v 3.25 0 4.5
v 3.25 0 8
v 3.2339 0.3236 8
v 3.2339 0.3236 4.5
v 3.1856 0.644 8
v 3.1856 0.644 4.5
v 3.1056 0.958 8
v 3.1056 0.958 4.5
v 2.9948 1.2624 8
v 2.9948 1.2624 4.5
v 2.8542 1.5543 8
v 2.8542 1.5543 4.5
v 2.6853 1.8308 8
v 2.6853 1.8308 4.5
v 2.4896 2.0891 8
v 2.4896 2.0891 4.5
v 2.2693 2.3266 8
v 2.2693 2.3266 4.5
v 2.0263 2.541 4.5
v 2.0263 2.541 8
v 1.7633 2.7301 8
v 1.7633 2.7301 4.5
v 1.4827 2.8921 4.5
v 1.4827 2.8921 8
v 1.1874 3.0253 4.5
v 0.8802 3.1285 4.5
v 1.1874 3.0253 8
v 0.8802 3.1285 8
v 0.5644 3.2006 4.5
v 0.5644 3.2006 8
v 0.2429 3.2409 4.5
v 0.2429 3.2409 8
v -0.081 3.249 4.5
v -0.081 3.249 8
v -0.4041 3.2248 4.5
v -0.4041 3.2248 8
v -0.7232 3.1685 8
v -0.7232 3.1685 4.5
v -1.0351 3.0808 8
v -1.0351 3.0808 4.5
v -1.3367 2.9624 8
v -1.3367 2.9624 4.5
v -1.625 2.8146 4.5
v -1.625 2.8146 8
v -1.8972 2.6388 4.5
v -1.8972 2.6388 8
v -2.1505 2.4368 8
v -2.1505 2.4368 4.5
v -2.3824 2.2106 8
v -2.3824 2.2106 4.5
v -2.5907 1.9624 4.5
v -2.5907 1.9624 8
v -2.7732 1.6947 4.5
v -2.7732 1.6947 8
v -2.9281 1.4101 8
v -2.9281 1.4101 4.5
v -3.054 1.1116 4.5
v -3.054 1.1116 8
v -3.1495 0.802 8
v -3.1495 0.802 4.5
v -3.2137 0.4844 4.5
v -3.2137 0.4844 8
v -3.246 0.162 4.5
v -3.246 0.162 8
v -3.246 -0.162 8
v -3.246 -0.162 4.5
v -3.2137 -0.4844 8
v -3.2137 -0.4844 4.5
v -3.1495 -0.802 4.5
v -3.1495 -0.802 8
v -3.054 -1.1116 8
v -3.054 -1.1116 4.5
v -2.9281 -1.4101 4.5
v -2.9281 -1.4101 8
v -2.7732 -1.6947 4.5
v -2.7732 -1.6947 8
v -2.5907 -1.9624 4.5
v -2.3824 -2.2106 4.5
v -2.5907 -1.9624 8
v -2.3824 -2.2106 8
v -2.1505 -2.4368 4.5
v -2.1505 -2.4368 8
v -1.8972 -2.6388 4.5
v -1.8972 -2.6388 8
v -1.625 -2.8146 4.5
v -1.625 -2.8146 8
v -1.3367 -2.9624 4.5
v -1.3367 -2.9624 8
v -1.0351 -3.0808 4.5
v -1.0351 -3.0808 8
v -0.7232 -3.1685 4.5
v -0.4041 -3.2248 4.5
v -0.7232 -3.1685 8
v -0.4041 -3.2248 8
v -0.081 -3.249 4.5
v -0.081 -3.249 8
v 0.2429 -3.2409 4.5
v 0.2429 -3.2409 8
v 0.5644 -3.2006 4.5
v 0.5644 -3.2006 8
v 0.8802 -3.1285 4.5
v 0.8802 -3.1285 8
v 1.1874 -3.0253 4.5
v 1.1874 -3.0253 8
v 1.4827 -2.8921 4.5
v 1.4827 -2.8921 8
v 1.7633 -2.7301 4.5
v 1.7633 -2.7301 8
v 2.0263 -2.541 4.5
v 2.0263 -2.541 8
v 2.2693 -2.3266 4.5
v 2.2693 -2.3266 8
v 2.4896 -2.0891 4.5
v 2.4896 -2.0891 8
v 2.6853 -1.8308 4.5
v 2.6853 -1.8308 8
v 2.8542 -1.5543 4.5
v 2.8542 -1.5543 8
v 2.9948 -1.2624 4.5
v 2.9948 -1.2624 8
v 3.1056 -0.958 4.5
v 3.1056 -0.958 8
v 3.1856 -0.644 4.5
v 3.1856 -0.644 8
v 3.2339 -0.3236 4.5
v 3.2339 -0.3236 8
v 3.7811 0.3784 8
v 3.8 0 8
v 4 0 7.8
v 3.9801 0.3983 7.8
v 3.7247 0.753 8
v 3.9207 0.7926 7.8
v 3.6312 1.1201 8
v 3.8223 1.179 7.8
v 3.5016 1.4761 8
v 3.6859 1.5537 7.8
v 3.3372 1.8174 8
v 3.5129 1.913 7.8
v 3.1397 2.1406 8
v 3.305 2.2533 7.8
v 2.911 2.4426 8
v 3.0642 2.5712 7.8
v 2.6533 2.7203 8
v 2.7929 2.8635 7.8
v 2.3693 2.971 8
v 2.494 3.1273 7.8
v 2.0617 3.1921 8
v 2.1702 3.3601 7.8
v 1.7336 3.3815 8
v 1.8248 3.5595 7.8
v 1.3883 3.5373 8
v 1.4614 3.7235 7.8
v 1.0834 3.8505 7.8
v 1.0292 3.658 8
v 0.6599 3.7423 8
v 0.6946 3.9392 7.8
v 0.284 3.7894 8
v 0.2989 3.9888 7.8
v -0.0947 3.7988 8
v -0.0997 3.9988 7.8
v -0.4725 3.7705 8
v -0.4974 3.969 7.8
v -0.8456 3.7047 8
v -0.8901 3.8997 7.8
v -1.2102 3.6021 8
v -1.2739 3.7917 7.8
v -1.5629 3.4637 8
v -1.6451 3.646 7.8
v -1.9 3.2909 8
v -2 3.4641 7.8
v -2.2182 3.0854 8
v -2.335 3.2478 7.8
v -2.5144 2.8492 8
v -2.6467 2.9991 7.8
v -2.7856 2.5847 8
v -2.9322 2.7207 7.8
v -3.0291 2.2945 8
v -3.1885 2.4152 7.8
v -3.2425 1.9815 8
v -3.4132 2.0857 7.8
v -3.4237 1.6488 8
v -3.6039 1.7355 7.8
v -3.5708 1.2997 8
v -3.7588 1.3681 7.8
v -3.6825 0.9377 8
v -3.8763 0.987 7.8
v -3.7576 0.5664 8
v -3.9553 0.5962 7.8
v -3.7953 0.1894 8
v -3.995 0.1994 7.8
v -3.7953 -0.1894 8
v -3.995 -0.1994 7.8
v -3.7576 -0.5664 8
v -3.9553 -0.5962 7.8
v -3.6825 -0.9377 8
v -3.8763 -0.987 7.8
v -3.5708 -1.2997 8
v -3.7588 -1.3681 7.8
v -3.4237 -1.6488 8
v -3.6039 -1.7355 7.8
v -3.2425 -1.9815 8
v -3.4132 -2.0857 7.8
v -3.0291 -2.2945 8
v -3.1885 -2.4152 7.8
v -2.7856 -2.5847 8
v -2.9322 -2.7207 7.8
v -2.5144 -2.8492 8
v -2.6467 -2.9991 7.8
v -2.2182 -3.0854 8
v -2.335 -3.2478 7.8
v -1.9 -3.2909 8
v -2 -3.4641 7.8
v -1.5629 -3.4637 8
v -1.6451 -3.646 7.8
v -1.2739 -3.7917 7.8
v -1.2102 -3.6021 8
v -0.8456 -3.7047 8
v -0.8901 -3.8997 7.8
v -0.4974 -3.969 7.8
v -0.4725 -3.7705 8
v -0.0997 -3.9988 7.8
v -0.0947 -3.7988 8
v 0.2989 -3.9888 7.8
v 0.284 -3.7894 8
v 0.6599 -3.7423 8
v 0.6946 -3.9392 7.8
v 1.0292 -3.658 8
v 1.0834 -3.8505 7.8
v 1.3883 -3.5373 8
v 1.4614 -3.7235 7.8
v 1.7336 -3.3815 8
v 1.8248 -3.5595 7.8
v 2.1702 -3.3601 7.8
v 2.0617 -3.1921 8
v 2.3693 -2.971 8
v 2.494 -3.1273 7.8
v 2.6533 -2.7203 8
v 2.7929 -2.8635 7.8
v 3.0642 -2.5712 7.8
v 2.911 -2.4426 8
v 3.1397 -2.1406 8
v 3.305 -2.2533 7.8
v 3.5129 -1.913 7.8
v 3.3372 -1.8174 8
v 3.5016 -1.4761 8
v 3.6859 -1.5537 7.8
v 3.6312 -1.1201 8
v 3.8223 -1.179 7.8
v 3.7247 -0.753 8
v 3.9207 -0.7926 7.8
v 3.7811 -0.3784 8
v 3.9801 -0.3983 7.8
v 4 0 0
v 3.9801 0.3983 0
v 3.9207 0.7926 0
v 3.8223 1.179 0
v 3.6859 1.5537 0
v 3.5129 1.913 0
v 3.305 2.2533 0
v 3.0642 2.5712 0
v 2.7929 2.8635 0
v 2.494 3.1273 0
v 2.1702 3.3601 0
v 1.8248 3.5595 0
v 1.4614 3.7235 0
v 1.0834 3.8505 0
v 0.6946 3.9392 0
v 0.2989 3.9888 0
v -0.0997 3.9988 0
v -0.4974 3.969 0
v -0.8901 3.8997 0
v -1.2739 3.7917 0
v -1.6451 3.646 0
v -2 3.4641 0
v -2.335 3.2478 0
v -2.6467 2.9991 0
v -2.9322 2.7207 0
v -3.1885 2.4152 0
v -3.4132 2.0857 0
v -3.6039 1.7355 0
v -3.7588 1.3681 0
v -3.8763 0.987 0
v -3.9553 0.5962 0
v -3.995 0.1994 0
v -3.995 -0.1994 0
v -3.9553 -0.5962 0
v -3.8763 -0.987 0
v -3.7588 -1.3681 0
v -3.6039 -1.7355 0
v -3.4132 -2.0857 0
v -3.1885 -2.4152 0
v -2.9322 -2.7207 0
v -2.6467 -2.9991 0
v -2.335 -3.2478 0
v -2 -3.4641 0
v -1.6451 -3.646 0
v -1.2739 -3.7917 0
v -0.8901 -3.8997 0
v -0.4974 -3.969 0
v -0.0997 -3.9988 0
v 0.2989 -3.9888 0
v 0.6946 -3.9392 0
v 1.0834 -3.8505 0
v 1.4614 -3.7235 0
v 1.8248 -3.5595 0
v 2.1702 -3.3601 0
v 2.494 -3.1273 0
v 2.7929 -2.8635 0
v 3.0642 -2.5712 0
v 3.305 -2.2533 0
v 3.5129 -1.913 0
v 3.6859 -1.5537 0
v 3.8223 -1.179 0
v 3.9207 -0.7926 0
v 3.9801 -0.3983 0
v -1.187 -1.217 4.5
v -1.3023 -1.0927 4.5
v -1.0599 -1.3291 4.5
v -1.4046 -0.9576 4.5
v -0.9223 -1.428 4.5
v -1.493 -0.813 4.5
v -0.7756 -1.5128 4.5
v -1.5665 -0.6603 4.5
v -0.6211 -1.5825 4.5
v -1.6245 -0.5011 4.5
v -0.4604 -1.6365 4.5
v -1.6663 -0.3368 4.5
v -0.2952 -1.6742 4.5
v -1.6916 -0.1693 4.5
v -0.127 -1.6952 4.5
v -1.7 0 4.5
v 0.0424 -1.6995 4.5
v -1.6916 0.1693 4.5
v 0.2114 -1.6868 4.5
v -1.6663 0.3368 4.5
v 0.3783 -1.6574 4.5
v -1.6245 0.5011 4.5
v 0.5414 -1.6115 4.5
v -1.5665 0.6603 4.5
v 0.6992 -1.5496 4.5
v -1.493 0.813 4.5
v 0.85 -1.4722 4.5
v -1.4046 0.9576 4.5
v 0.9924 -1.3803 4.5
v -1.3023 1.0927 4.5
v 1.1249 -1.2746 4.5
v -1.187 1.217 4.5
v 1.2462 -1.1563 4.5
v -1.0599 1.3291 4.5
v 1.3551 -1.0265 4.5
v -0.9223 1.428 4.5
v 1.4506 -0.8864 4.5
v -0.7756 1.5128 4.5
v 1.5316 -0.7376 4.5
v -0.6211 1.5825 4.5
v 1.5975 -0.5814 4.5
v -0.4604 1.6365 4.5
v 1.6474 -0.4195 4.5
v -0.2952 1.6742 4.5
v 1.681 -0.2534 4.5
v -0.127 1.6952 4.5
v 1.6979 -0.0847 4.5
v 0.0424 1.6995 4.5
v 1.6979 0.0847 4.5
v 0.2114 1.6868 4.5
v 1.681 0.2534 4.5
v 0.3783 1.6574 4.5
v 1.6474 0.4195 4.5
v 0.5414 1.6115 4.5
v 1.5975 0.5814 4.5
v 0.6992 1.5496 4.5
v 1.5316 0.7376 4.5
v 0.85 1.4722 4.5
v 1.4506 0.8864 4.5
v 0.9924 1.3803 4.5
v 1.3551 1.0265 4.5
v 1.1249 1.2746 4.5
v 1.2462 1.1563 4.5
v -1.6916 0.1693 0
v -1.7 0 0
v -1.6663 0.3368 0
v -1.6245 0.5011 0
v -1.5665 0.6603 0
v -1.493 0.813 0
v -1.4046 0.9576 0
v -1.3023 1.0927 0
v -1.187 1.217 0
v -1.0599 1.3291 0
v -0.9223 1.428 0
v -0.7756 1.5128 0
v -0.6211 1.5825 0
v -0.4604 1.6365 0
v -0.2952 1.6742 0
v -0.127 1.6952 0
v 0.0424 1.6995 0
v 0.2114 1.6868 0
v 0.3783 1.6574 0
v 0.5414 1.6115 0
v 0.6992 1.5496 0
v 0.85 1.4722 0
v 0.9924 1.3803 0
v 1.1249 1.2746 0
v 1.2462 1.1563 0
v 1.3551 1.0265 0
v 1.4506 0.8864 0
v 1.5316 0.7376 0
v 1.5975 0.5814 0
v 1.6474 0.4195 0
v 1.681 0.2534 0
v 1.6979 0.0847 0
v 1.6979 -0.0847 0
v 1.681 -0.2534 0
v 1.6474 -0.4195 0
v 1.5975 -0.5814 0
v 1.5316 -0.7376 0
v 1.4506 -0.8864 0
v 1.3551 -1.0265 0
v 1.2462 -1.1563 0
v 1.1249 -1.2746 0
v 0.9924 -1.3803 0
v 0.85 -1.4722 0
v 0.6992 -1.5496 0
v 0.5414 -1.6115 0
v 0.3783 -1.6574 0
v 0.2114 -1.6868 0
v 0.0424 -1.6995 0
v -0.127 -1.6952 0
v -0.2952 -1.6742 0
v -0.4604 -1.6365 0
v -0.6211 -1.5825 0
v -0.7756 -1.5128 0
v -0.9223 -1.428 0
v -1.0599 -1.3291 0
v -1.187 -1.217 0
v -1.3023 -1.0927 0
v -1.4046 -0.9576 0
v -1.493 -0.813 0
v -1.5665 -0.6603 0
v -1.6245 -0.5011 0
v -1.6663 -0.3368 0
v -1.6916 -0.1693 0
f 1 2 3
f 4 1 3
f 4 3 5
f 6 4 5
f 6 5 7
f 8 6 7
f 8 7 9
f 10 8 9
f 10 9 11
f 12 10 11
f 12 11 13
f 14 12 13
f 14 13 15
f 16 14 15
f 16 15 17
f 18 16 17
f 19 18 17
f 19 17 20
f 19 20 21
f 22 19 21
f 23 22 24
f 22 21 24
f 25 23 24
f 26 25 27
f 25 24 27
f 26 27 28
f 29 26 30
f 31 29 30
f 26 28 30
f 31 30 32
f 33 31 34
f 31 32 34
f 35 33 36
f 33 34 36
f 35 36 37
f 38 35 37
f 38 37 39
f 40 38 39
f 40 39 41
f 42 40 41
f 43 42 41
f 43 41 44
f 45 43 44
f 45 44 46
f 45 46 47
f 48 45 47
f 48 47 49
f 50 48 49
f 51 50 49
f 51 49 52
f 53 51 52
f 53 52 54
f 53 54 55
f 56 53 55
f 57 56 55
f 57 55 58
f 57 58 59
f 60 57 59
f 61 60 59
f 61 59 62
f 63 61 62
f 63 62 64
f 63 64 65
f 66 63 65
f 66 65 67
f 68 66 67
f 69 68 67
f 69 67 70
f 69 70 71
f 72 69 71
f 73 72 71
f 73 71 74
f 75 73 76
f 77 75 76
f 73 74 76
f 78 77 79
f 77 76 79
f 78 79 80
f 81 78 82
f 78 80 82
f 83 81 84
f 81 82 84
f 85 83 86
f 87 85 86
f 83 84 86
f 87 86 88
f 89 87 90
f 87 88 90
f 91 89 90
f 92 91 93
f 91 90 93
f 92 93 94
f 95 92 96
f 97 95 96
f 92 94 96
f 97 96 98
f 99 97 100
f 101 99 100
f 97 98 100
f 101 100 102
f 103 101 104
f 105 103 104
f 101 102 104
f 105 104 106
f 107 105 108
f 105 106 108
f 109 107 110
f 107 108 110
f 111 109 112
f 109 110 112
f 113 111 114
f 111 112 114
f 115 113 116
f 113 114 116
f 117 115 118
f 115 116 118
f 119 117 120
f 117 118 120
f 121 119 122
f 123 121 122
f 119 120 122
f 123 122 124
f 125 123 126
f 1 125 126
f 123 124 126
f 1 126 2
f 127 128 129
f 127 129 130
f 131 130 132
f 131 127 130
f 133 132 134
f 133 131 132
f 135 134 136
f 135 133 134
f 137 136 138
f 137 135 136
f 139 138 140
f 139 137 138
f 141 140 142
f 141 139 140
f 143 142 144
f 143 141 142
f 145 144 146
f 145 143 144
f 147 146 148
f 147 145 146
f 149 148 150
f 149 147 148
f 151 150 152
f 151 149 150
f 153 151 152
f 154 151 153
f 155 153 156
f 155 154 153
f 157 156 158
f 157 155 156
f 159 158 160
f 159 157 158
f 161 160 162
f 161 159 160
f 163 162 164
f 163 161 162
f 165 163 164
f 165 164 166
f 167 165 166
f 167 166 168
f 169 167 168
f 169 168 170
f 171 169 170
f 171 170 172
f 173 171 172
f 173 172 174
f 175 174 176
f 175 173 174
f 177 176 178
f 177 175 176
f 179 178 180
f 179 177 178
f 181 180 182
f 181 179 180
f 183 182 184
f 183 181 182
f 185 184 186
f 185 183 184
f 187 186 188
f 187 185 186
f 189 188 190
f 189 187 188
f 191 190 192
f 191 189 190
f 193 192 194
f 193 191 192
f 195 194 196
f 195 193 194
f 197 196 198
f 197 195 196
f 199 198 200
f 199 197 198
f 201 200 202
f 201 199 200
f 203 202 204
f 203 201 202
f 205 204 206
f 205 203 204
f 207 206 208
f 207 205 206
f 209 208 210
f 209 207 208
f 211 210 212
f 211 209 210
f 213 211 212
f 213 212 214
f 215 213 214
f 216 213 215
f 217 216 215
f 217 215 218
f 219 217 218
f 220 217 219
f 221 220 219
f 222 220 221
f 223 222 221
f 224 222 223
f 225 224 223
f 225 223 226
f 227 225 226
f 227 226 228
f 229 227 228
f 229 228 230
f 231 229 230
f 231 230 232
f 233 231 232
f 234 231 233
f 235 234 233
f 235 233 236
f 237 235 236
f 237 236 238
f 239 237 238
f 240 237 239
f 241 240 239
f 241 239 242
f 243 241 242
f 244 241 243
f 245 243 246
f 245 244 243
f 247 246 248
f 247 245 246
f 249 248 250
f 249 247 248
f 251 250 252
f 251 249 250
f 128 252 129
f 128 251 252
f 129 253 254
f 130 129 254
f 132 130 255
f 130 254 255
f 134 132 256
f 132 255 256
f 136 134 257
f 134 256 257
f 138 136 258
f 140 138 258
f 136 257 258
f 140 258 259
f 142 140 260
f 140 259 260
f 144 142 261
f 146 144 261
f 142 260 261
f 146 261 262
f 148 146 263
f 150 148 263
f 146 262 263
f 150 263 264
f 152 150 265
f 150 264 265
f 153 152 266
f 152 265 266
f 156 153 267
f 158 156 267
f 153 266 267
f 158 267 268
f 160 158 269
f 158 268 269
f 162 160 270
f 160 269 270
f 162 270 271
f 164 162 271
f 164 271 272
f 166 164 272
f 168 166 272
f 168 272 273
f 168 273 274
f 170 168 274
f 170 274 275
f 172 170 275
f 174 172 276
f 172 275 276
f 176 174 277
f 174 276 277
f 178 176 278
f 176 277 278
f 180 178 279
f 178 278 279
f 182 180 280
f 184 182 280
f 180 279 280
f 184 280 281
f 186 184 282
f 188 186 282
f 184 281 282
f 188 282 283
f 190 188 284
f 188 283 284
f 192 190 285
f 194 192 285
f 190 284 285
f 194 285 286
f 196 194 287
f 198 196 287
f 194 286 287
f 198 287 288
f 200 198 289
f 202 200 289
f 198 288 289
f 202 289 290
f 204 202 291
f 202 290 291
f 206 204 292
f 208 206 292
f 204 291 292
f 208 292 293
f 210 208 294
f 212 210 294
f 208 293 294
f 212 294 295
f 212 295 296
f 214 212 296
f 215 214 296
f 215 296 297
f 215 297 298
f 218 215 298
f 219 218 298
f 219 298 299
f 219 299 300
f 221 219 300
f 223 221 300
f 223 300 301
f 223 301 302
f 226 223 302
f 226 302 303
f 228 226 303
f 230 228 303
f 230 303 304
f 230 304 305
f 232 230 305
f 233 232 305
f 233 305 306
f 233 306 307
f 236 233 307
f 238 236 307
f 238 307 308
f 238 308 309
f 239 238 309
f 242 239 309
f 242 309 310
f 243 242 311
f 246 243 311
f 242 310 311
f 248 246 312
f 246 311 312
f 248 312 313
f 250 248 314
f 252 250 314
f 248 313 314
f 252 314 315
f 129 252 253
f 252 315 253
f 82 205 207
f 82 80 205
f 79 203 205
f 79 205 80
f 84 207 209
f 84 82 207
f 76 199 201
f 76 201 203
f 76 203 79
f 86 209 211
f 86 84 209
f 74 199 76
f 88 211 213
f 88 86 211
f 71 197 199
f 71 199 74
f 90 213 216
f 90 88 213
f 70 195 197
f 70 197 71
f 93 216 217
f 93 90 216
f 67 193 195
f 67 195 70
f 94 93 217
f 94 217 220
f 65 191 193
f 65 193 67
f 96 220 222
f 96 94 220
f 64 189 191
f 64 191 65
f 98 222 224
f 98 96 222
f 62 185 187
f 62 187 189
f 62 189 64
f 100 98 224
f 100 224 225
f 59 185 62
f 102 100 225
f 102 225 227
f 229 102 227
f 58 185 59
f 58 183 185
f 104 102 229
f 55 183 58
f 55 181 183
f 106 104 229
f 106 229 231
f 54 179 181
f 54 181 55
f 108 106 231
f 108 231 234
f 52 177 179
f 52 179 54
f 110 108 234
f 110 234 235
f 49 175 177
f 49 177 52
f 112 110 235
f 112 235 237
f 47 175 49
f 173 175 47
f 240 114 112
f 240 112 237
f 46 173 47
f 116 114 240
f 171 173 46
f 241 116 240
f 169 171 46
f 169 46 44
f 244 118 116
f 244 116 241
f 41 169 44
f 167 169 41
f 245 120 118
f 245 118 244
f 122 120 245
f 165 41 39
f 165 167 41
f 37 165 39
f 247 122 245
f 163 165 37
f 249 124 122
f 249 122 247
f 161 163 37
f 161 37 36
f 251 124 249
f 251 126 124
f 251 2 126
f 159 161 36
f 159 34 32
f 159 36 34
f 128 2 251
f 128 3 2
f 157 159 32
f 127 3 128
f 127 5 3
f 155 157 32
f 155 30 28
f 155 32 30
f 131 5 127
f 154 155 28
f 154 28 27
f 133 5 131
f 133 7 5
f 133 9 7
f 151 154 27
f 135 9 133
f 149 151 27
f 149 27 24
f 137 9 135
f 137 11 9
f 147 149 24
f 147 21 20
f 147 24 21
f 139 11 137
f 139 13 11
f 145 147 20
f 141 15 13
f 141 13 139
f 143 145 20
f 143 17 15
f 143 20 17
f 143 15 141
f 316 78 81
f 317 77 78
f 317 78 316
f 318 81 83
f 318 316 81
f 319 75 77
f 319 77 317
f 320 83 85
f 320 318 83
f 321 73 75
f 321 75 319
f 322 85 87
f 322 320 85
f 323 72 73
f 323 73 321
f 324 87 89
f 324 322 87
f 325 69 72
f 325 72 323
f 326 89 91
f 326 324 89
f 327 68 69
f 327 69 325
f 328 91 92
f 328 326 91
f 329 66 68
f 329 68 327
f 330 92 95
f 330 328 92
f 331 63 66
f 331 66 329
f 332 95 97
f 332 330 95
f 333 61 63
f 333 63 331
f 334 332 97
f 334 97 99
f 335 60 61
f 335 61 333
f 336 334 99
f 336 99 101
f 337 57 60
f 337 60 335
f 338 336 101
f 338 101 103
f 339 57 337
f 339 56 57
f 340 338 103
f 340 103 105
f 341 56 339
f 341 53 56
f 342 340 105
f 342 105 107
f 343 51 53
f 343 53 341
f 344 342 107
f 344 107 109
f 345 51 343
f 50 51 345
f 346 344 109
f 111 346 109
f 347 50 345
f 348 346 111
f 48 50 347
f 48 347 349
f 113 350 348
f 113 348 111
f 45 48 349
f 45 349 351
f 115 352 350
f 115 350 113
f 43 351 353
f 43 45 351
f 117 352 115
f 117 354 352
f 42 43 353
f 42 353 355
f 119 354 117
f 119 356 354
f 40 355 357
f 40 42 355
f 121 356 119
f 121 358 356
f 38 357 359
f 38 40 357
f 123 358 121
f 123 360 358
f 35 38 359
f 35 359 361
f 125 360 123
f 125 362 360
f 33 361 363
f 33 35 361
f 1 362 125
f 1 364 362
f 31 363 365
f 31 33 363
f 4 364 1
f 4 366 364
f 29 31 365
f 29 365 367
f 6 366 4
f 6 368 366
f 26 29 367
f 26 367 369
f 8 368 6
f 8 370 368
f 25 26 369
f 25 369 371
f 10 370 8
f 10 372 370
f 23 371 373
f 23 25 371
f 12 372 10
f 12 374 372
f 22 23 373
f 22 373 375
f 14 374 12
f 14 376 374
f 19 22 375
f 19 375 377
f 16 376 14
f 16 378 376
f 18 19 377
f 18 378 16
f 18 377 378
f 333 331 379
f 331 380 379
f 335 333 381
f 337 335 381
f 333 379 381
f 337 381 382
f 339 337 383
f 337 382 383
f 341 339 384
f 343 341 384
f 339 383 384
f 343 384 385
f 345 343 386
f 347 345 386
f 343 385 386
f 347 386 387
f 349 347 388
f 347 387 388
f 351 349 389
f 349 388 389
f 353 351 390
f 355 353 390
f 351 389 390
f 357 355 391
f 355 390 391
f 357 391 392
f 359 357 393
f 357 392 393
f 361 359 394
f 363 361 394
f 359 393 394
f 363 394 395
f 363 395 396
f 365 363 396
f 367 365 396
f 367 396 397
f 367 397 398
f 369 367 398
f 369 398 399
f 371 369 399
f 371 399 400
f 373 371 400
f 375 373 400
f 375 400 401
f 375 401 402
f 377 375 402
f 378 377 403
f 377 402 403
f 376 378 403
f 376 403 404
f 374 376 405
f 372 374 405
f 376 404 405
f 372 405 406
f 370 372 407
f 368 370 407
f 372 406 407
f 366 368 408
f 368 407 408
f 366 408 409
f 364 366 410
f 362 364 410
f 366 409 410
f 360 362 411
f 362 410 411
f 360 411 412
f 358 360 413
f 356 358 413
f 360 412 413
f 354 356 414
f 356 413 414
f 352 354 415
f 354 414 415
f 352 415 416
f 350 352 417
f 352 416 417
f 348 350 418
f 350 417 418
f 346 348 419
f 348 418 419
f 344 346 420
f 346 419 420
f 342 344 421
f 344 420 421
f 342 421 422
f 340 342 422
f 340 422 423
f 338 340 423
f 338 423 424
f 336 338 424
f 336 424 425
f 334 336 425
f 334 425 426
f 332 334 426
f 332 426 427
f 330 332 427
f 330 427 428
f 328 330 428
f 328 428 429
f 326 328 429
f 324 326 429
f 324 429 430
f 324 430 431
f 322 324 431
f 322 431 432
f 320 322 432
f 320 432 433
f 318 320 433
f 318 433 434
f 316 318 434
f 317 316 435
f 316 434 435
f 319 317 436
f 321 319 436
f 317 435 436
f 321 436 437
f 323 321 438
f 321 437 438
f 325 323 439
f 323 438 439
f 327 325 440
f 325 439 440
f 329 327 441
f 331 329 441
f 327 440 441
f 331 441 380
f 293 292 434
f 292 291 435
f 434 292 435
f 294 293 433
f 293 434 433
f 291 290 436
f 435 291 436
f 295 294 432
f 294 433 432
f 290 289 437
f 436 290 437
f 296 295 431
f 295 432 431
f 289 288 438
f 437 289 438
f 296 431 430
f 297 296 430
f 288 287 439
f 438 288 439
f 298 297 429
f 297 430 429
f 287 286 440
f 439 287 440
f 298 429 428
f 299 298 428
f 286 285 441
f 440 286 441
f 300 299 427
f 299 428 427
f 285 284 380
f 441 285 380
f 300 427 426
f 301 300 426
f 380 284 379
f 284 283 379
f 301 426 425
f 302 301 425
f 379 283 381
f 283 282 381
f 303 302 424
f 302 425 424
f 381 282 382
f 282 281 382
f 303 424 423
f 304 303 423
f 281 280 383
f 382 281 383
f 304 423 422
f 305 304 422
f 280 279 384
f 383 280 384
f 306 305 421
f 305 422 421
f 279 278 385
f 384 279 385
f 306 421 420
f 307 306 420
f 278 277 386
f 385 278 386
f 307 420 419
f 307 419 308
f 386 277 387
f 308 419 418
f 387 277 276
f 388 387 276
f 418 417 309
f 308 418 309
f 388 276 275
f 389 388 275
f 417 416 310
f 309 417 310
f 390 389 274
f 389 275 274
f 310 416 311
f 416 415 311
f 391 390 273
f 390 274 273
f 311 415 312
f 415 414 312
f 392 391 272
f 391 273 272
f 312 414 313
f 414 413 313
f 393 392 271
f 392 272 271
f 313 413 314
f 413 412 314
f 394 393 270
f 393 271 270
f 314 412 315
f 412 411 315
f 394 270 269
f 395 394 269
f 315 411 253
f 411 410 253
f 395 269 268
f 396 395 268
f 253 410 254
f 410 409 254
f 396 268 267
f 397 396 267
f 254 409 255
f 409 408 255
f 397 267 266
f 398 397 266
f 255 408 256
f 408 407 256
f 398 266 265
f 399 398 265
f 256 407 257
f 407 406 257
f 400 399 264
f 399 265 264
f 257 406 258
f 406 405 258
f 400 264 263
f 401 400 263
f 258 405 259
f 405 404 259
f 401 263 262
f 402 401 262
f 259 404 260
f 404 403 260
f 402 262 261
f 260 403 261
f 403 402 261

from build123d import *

# Parameters (mm, degrees)
ESQUISSE1_R                                        = 4
BOSS_EXTRU_1_DEPTH                                 = 8
CHAMBRAGE_POUR_VIS_T_TE_HEXAGONALE_M31_D           = 3.4
CHAMBRAGE_POUR_VIS_T_TE_HEXAGONALE_M31_CBORE_D     = 6.5
CHAMBRAGE_POUR_VIS_T_TE_HEXAGONALE_M31_CBORE_DEPTH = 3.5
CHANFREIN1_SIZE                                    = 0.2


with BuildPart() as part:
    # Esquisse1 → Boss.-Extru.1 (new body)
    with BuildSketch(Plane.XY):
        Circle(ESQUISSE1_R)
    extrude(amount=BOSS_EXTRU_1_DEPTH)

    # Chambrage pour vis à tête hexagonale M31 (through all)
    with Locations(Plane.XY.offset(8)):
        with Locations((0, 0)):
            CounterBoreHole(CHAMBRAGE_POUR_VIS_T_TE_HEXAGONALE_M31_D / 2, CHAMBRAGE_POUR_VIS_T_TE_HEXAGONALE_M31_CBORE_D / 2, CHAMBRAGE_POUR_VIS_T_TE_HEXAGONALE_M31_CBORE_DEPTH)

    # Chanfrein1
    chanfrein1_edges = [part.edges().sort_by_distance(p)[0] for p in [
        (-4, 0, 8),
    ]]
    chamfer(chanfrein1_edges, length=CHANFREIN1_SIZE)


solid = part.part
